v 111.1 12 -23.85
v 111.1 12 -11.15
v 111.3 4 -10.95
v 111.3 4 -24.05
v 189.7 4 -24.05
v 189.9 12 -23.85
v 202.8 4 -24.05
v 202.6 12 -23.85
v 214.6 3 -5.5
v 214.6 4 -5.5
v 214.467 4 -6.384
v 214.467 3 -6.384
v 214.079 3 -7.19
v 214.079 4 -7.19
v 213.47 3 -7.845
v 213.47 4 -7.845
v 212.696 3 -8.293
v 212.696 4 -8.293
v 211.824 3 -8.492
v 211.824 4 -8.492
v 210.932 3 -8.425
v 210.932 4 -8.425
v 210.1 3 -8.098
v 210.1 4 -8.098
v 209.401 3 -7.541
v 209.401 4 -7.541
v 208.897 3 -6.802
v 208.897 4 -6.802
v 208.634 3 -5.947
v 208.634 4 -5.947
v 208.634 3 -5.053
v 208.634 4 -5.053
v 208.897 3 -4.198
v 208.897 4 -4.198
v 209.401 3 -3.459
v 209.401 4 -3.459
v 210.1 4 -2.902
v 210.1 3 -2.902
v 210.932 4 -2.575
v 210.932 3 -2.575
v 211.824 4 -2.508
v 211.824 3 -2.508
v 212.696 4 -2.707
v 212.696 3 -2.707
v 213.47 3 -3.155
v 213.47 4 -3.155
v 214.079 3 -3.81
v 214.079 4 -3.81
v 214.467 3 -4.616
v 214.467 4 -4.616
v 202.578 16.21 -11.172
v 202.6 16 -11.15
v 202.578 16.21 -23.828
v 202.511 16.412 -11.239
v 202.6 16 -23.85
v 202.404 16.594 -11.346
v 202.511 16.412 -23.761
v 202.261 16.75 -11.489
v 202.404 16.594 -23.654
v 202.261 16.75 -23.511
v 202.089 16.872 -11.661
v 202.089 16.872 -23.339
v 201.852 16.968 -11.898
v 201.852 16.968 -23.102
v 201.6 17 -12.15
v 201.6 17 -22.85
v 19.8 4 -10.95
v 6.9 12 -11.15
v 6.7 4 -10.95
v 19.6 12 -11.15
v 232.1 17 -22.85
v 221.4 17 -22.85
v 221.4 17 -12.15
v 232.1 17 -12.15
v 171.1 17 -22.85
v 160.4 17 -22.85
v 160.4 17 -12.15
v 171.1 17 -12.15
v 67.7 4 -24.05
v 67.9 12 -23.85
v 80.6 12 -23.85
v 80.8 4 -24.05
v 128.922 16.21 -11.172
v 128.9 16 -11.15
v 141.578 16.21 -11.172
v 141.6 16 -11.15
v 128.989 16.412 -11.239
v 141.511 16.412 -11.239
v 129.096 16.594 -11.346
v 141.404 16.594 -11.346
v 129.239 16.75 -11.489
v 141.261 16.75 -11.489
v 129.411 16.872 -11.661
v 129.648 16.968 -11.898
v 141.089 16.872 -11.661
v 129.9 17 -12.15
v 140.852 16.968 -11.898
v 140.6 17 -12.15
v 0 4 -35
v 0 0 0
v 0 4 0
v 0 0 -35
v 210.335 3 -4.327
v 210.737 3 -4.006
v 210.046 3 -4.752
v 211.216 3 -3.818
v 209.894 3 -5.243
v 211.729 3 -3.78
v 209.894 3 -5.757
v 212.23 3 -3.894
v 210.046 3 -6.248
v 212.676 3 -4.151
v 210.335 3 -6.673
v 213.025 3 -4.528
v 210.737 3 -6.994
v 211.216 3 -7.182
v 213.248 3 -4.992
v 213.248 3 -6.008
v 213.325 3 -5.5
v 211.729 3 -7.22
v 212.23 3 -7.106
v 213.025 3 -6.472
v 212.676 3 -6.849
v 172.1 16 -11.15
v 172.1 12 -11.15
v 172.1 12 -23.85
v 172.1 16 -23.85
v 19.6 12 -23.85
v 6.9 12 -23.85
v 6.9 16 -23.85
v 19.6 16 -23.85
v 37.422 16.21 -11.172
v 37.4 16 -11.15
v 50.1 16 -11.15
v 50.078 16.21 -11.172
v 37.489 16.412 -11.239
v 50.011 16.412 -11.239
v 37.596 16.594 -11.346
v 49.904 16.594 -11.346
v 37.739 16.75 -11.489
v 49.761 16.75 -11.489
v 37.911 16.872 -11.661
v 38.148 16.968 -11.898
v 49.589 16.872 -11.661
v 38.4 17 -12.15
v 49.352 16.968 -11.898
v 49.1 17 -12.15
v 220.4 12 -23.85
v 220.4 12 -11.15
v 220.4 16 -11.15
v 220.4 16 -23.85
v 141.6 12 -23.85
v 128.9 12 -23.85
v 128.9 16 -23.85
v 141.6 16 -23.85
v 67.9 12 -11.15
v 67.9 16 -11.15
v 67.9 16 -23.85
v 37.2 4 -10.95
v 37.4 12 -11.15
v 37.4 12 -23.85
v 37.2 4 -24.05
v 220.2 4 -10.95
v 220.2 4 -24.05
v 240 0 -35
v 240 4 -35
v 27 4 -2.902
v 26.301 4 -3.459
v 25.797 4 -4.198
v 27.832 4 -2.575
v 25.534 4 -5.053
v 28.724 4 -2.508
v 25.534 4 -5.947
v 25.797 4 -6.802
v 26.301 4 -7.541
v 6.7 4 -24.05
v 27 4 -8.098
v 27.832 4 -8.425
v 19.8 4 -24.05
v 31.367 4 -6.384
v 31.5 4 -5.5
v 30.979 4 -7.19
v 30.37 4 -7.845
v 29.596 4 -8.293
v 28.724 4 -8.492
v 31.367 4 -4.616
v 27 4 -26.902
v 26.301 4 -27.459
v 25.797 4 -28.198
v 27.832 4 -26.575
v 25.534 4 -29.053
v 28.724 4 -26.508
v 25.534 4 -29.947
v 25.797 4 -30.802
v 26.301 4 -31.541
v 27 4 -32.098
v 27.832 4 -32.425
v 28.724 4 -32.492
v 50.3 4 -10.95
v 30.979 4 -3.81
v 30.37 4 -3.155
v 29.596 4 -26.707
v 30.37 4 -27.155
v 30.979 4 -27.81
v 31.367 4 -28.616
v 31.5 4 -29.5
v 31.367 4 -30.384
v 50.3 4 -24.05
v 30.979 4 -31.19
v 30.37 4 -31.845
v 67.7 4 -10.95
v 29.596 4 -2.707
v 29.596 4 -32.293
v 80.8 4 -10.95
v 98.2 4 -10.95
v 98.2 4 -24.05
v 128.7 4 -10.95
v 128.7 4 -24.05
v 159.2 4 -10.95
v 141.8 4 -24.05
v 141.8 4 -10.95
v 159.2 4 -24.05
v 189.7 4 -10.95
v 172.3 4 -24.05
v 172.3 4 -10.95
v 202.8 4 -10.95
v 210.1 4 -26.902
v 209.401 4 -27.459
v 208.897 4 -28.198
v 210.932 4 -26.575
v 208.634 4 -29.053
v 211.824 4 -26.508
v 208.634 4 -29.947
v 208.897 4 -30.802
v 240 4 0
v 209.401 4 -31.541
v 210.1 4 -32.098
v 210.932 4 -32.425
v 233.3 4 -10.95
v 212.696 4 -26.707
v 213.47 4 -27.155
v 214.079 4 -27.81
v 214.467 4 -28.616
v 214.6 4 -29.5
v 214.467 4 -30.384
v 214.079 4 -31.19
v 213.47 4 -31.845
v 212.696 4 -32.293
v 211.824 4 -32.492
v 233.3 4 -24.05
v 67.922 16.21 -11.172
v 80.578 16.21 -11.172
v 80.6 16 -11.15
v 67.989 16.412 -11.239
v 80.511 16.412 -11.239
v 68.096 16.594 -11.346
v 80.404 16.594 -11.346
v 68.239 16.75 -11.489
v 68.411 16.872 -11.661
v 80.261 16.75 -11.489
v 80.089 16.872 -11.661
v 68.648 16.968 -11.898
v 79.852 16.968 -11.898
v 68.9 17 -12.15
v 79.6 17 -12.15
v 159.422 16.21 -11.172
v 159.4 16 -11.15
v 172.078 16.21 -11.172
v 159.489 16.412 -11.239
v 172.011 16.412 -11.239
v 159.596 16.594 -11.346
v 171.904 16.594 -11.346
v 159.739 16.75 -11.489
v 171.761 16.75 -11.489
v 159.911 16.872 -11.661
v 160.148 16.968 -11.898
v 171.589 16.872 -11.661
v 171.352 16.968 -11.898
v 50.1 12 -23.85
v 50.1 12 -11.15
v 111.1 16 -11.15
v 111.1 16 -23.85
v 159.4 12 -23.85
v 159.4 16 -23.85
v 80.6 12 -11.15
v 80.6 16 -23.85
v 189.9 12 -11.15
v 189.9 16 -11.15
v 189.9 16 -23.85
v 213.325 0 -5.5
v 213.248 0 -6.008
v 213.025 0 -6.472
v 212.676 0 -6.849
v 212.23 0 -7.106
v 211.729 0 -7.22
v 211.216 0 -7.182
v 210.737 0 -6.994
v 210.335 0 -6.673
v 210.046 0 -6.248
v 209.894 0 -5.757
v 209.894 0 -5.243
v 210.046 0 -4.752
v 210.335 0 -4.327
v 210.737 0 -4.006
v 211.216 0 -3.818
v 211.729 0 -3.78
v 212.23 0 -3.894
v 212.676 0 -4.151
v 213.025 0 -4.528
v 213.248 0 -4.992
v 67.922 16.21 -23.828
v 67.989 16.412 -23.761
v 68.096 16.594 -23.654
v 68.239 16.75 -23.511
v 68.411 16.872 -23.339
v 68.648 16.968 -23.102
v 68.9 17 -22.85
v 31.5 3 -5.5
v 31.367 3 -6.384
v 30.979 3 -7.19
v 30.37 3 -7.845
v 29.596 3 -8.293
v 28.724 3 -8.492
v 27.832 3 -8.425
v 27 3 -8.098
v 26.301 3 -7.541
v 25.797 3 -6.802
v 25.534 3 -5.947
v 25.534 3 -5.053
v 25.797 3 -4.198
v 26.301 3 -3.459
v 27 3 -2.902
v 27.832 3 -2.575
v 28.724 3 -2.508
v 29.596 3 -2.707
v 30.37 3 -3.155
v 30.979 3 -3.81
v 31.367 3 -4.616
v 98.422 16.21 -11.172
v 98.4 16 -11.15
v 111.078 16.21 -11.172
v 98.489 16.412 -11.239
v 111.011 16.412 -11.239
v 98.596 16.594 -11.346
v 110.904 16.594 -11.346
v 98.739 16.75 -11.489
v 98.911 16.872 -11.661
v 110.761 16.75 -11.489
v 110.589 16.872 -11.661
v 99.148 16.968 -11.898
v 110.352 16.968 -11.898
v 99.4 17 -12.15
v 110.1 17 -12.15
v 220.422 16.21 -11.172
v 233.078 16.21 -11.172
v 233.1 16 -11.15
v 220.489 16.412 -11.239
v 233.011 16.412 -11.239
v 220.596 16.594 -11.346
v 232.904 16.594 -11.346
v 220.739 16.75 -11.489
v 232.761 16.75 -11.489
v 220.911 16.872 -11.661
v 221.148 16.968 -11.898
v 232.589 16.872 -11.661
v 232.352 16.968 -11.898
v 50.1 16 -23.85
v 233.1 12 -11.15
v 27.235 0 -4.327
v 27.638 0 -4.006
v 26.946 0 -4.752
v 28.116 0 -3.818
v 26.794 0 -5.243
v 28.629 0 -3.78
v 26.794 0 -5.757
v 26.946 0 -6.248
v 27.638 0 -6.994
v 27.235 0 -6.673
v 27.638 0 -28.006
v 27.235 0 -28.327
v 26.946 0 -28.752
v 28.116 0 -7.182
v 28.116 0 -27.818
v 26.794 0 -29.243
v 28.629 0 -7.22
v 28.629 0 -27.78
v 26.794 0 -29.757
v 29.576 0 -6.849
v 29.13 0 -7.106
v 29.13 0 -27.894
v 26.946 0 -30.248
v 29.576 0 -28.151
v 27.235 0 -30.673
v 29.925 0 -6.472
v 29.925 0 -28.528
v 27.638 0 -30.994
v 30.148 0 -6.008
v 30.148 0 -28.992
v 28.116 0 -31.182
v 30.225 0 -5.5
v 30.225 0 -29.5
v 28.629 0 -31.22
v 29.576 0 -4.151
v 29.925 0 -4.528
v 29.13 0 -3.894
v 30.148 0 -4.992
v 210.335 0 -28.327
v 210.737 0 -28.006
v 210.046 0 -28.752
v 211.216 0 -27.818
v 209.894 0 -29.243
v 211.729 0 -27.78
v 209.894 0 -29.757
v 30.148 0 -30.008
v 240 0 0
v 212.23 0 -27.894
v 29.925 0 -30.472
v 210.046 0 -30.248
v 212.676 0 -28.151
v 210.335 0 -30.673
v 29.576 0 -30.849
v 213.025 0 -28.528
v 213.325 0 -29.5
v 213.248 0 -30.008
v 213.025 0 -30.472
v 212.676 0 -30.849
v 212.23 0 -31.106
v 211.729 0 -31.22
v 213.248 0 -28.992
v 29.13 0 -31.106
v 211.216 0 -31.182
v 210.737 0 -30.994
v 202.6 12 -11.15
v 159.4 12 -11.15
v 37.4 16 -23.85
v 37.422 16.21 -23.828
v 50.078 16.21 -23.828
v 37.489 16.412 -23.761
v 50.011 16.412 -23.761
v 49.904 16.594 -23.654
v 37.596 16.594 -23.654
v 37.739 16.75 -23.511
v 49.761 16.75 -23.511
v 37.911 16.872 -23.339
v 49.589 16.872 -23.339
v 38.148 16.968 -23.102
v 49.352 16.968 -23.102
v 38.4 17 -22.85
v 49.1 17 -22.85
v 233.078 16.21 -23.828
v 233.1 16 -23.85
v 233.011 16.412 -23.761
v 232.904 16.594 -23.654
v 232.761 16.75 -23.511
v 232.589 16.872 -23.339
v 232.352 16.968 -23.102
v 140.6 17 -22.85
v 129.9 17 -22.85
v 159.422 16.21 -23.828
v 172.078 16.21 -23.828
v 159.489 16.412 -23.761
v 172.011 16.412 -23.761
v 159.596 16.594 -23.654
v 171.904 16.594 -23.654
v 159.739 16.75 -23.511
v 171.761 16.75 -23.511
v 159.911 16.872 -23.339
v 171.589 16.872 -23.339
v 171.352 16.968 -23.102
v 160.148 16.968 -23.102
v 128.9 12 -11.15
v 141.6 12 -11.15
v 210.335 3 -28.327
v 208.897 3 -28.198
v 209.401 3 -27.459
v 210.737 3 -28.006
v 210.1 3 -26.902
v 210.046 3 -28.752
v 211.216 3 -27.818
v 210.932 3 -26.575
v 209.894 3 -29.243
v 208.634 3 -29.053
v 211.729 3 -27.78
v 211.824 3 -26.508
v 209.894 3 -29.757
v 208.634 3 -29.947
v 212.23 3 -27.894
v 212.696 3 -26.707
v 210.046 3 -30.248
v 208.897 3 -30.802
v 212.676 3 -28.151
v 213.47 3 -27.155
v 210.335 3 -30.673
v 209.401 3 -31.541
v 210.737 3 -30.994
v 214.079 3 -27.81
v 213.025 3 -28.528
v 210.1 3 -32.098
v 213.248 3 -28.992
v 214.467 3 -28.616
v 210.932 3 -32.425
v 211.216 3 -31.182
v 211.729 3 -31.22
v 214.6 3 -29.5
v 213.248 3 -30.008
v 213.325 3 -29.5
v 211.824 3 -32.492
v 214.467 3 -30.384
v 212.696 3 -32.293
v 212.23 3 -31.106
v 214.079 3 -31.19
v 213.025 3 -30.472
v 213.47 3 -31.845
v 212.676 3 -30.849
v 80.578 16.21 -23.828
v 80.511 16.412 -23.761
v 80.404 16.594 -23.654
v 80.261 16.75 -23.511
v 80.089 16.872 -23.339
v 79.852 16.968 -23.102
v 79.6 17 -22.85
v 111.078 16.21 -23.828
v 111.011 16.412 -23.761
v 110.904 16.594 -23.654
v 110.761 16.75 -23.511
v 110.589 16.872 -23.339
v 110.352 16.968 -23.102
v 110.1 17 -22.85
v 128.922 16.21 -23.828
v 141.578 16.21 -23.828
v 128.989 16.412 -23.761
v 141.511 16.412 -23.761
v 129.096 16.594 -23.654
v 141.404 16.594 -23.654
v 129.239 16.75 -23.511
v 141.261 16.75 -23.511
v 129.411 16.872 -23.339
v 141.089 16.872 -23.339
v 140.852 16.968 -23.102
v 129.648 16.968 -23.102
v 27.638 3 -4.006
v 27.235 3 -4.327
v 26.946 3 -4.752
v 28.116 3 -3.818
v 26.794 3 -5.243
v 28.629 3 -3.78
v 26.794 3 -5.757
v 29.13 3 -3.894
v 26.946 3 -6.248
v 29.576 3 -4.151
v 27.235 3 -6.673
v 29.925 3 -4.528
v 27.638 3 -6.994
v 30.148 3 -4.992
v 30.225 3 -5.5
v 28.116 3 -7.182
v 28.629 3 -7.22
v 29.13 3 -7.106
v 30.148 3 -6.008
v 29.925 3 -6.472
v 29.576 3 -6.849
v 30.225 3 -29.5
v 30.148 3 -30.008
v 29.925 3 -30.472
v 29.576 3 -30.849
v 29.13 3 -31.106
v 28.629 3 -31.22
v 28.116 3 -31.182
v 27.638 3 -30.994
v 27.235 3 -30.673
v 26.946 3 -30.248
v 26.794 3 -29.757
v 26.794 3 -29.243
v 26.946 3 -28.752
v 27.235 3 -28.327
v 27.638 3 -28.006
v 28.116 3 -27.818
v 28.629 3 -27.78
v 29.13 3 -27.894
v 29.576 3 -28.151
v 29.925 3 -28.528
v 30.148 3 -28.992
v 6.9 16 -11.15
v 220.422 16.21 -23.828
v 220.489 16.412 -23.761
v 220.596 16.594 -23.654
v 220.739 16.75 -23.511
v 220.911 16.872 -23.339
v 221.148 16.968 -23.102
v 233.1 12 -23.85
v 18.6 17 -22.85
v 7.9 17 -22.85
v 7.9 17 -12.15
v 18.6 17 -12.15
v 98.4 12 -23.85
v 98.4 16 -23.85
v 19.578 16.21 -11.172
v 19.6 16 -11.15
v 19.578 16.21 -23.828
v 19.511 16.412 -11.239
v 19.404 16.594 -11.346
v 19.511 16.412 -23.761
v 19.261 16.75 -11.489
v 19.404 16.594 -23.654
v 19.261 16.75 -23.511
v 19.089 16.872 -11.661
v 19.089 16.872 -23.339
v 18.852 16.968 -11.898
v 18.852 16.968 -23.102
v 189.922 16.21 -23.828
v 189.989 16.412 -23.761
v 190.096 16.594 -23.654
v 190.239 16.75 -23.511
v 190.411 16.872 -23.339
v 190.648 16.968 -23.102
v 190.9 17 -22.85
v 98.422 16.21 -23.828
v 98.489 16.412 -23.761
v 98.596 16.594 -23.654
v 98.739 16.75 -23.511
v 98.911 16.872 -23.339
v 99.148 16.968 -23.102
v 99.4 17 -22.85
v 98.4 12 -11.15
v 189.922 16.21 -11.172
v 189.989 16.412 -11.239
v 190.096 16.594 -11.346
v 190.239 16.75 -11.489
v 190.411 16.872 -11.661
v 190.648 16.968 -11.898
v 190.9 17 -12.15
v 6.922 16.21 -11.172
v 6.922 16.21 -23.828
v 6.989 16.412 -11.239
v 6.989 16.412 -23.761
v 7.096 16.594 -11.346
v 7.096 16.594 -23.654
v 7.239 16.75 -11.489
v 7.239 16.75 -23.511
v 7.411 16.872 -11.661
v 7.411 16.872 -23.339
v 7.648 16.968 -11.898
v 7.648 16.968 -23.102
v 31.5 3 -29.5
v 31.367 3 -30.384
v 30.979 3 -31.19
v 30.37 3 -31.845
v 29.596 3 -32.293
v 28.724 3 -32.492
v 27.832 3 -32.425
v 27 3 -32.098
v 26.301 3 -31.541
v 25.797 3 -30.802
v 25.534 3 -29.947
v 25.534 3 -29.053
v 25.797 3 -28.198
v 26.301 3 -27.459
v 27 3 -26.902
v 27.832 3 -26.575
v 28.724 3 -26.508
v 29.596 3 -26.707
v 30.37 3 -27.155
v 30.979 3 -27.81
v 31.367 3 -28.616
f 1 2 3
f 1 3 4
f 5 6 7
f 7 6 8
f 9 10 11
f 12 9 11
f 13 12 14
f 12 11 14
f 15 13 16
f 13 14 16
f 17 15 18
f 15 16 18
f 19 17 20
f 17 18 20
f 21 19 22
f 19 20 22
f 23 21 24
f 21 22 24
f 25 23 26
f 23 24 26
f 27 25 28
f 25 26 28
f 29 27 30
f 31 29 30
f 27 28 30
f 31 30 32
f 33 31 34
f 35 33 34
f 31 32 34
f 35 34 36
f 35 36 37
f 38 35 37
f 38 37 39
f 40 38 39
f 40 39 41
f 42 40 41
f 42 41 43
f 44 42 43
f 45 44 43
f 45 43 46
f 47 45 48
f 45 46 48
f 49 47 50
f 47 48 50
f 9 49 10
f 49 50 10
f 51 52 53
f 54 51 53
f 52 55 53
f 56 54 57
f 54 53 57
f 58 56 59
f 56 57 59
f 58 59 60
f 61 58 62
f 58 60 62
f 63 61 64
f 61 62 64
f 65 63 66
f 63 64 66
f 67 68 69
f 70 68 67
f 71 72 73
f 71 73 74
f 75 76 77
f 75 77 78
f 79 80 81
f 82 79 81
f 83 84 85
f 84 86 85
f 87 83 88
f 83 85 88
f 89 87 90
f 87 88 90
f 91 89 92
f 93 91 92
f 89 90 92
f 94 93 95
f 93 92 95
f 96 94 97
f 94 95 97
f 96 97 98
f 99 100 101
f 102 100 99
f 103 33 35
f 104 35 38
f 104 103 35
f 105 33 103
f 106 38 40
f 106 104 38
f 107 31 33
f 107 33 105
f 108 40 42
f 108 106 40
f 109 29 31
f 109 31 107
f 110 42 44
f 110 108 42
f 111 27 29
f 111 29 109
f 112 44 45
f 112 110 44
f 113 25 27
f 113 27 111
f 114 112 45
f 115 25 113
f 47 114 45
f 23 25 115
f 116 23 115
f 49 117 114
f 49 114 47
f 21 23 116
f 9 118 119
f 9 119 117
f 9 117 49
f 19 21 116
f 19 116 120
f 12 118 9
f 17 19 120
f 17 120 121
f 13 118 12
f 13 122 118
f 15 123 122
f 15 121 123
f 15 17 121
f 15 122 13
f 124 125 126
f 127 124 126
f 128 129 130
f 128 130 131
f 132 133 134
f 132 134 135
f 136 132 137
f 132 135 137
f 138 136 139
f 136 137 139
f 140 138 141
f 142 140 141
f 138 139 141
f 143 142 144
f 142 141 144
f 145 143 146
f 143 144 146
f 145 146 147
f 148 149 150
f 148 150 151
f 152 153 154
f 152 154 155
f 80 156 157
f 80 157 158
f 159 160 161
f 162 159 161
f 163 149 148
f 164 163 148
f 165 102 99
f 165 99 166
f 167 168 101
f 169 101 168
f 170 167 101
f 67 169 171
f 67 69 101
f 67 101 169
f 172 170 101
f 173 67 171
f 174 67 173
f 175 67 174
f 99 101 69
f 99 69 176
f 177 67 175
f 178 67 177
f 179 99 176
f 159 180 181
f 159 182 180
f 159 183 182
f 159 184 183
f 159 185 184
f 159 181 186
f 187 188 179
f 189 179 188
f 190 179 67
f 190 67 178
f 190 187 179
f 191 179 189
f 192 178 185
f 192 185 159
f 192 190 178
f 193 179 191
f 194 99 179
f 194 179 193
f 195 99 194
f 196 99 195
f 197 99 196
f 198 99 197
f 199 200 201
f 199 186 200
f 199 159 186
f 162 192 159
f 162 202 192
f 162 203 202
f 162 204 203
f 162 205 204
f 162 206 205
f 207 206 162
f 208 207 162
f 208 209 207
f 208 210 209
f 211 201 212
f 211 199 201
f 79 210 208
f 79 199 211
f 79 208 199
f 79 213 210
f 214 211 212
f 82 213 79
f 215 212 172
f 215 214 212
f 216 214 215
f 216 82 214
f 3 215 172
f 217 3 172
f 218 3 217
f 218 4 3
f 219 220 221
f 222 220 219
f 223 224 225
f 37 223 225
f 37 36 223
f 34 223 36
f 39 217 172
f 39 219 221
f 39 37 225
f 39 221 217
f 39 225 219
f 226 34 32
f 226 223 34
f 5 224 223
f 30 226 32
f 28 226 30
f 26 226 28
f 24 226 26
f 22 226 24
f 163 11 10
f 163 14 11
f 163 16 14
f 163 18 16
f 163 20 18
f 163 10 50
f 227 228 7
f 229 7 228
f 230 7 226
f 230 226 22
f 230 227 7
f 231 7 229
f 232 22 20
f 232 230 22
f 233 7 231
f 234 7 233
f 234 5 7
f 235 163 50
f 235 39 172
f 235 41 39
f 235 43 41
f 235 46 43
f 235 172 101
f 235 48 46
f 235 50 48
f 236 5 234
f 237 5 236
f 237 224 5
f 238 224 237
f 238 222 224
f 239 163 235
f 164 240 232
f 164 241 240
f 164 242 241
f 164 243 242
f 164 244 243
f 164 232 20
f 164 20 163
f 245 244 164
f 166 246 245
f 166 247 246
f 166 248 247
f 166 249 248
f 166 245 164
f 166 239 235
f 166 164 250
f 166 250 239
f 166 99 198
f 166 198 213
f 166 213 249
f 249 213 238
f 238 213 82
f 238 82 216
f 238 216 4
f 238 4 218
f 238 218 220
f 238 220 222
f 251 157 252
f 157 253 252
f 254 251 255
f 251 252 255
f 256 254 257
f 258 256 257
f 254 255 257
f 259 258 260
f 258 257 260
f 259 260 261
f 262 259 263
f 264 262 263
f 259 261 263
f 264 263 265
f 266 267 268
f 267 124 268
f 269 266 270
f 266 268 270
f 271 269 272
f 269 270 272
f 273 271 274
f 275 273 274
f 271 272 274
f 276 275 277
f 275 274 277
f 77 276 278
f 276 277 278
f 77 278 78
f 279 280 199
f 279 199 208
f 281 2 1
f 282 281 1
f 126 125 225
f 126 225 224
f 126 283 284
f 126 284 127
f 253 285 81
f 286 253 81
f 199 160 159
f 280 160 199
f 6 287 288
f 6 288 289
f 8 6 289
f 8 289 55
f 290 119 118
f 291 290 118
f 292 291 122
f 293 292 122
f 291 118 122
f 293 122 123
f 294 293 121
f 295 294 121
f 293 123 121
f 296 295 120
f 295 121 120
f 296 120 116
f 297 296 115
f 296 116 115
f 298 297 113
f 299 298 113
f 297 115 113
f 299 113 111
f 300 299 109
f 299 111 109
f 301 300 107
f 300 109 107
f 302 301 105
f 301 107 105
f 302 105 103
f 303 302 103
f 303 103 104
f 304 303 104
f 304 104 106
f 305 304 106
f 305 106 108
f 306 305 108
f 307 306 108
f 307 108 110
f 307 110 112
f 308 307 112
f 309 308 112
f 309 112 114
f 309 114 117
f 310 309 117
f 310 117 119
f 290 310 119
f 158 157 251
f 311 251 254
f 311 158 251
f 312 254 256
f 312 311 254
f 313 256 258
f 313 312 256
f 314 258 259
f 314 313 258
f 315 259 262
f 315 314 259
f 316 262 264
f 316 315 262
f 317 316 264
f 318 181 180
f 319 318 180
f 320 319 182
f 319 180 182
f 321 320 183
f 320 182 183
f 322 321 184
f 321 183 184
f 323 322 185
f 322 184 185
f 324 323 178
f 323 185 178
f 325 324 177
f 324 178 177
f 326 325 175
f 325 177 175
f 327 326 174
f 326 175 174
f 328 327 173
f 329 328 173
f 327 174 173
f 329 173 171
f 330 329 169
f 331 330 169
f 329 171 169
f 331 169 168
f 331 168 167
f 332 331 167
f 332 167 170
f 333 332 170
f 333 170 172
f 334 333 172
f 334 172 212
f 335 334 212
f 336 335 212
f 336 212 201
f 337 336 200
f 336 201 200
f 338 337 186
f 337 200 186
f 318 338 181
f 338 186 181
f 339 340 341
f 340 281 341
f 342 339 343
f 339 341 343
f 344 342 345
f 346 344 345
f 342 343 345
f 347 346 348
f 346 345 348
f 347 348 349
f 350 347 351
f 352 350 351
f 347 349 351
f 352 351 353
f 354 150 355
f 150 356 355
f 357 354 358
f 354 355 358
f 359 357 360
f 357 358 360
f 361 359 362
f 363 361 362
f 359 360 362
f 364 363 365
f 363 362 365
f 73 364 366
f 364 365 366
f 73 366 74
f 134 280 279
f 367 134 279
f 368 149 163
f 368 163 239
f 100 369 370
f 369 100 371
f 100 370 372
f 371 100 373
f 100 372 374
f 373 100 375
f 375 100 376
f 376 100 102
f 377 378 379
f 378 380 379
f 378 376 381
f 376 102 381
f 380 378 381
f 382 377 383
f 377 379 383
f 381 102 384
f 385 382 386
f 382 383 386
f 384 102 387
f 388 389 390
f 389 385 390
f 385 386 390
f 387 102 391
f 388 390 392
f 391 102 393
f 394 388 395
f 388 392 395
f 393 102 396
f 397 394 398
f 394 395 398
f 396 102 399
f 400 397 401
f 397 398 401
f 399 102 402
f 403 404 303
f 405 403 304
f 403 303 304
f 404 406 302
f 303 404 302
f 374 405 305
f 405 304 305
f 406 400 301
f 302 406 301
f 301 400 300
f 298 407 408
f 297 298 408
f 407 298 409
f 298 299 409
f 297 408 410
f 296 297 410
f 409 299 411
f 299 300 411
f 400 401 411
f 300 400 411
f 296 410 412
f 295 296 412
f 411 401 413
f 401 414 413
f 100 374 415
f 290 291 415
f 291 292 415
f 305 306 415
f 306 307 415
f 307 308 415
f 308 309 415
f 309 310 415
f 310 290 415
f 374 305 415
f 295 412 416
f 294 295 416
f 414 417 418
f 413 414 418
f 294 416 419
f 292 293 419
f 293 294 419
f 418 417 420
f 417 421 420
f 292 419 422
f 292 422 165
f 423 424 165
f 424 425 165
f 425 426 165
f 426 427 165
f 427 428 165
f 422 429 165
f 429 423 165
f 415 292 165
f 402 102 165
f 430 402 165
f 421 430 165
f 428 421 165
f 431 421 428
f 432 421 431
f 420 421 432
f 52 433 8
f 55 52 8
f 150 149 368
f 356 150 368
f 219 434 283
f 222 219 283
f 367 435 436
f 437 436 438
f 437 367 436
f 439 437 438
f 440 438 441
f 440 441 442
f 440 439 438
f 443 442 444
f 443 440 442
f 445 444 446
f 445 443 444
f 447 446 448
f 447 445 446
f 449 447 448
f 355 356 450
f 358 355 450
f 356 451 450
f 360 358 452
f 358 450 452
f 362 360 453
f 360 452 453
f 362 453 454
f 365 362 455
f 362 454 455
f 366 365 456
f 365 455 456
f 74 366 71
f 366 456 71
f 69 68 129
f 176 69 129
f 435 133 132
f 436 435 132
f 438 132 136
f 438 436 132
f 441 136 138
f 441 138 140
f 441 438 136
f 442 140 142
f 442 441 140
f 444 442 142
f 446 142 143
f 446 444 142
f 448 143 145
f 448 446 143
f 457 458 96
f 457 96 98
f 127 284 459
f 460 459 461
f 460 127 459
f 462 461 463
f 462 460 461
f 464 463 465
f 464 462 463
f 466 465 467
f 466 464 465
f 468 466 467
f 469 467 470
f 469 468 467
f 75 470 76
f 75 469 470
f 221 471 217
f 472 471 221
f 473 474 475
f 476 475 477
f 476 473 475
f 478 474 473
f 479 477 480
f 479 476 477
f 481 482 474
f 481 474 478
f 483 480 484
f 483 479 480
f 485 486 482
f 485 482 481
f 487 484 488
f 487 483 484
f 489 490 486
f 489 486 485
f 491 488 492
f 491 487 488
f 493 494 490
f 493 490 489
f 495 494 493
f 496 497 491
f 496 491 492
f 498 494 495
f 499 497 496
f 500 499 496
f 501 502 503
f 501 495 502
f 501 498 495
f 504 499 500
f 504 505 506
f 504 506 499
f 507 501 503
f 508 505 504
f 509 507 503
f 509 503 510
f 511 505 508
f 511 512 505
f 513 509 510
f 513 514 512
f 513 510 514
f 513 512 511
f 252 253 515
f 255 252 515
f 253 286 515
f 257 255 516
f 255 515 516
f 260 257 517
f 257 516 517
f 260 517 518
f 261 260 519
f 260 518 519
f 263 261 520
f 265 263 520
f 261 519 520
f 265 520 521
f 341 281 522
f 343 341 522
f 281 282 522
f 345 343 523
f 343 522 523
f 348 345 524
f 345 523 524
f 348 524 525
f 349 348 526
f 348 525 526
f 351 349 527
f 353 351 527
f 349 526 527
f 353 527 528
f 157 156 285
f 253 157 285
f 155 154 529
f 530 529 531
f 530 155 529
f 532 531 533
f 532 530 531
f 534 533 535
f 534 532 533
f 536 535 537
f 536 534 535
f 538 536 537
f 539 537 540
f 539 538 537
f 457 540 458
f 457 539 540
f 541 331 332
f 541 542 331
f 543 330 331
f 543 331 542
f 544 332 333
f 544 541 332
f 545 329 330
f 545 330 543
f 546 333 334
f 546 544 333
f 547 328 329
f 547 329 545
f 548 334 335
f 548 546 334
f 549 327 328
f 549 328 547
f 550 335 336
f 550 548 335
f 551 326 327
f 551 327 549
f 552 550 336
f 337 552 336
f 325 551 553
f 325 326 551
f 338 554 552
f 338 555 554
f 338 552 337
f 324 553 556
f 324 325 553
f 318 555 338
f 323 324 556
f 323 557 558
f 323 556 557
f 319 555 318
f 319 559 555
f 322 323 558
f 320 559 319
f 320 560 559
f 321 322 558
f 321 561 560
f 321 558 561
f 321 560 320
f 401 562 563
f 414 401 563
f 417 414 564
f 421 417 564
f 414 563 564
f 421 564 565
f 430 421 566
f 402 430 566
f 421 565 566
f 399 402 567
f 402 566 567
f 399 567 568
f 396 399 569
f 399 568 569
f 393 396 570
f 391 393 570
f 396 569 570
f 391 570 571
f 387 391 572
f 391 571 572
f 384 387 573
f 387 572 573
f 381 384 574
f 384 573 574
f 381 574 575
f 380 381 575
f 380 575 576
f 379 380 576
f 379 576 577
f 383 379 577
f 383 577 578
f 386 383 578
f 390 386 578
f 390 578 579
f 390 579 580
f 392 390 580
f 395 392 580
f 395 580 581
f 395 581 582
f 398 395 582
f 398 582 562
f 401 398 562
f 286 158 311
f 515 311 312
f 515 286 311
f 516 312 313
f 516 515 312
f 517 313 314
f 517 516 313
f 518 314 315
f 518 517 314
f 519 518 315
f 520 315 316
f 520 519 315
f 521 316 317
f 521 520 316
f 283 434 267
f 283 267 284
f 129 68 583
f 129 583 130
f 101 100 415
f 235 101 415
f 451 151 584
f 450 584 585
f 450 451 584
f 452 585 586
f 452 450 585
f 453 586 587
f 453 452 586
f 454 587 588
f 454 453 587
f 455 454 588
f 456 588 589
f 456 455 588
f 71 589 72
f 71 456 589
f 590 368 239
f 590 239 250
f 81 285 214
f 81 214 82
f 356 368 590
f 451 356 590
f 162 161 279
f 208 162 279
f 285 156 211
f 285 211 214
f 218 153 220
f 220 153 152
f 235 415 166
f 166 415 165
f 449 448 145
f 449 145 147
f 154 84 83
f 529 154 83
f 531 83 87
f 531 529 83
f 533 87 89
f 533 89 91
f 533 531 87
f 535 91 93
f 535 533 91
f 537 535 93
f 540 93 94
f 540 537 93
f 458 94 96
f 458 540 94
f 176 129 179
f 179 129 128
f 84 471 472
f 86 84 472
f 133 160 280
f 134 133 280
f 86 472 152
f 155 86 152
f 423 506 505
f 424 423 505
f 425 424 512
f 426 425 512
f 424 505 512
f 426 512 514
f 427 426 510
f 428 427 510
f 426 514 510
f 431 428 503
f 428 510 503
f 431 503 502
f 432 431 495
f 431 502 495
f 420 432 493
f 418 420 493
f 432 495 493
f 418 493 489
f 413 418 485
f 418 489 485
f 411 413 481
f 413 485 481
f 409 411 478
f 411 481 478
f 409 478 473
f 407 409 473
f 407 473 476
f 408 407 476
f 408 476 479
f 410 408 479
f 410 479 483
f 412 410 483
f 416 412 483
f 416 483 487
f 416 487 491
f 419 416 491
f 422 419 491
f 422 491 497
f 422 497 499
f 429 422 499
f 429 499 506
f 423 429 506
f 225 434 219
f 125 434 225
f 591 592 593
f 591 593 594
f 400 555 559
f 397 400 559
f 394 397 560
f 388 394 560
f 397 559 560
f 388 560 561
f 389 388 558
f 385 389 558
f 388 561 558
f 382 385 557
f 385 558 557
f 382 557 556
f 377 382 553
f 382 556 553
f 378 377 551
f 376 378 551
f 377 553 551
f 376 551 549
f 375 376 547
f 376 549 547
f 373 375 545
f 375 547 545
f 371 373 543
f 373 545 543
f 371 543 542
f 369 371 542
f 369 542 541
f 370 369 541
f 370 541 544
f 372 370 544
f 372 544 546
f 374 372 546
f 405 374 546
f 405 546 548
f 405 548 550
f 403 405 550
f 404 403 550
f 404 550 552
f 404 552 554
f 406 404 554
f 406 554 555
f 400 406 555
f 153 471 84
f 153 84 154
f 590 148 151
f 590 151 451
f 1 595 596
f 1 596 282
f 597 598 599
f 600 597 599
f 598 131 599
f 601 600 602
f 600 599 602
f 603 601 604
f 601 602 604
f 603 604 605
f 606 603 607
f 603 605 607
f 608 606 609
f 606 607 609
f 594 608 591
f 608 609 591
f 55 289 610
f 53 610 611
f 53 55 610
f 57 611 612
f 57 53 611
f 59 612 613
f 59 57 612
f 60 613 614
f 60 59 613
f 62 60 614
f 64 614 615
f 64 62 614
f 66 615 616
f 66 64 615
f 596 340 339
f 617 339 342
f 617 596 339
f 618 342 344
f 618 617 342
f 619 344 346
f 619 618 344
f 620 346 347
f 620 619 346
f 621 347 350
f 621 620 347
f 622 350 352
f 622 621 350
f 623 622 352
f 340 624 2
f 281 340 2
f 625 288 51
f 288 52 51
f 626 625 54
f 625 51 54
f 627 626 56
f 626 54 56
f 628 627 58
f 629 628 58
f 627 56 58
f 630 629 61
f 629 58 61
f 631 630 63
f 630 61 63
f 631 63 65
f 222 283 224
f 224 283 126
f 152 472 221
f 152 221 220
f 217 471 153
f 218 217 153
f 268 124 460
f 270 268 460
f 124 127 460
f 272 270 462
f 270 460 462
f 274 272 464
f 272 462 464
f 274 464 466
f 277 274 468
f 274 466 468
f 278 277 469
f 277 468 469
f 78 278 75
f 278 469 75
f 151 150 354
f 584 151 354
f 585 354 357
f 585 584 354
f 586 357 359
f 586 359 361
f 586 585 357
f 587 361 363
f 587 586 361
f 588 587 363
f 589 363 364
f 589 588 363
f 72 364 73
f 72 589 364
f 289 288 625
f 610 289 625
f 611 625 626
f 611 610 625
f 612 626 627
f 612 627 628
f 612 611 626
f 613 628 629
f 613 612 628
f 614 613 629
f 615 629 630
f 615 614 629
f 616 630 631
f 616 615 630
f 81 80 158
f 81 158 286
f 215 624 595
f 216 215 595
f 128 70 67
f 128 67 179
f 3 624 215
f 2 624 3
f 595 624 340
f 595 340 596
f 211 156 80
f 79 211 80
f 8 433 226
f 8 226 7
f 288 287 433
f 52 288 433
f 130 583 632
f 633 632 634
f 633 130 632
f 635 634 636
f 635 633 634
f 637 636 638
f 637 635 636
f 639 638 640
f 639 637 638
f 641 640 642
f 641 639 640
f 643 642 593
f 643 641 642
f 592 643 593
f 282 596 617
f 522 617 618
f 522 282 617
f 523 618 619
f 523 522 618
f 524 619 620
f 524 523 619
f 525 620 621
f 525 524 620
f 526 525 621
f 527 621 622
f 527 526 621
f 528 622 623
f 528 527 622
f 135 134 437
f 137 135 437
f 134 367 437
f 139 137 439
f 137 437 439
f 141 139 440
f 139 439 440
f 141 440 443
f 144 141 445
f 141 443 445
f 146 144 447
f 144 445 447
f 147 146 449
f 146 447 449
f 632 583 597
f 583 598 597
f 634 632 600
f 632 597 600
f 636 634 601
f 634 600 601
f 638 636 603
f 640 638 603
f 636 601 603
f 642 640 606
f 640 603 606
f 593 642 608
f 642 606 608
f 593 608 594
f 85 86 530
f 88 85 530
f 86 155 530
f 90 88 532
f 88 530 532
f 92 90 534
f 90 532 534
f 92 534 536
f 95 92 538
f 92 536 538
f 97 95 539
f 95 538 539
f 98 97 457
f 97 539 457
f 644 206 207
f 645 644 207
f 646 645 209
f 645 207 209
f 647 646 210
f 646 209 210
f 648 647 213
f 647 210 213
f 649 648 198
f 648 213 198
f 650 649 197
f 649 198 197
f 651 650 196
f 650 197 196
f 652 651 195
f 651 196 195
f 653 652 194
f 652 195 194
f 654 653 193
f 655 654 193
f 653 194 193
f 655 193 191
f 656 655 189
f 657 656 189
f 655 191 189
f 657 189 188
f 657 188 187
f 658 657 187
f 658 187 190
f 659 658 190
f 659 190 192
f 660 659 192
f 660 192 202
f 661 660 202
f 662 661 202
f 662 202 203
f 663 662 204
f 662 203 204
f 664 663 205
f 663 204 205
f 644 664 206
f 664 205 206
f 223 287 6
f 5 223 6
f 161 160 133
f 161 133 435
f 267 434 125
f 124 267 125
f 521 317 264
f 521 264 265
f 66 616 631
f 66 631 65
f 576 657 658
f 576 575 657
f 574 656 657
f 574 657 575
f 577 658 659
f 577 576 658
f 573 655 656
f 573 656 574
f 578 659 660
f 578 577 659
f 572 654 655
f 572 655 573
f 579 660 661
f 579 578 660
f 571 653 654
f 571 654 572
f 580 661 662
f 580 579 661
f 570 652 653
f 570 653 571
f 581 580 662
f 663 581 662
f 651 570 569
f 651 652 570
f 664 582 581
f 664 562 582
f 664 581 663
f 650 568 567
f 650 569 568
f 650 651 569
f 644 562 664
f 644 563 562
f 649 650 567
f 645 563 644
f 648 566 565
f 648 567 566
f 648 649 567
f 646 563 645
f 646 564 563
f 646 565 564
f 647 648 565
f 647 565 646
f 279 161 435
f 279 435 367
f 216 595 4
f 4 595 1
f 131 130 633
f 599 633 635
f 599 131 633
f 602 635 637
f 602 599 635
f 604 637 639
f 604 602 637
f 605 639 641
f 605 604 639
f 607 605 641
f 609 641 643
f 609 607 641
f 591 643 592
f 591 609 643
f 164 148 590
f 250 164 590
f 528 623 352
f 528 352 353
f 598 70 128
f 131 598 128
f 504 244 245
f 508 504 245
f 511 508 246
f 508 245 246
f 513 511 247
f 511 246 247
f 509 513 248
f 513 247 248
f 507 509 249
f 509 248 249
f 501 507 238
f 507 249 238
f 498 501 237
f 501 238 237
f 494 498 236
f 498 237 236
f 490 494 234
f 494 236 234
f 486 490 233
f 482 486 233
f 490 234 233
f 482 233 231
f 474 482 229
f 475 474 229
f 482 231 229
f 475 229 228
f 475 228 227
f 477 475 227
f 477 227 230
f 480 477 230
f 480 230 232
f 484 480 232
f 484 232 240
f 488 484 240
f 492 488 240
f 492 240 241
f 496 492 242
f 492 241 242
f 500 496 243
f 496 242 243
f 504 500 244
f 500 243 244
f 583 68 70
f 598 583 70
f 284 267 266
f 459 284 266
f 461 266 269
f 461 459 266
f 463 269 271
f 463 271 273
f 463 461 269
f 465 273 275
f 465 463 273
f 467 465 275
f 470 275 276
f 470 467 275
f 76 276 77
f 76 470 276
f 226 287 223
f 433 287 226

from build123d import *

# Parameters (mm, degrees)
SKETCH1_W                = 240
SKETCH1_H                = 35
SKETCH1_W_2              = 12.7
SKETCH1_H_2              = 12.7
BOSS_EXTRUDE1_DEPTH      = 4
SKETCH2_W                = 12.7
SKETCH2_H                = 12.7
BOSS_EXTRUDE2_DEPTH      = 13
BOSS_EXTRUDE2_DEPTH_BACK = 4
CHAMFER1_SIZE            = 0.2
CHAMFER1_SIZE2           = 8
SKETCH3_R                = 1.725
CUT_EXTRUDE1_DEPTH       = 5
SKETCH4_R                = 3
CUT_EXTRUDE2_DEPTH       = 1
FILLET1_R                = 1


with BuildPart() as part:
    # Sketch1 → Boss-Extrude1 (new body)
    with BuildSketch(Plane(origin=(0, 0, 0), x_dir=(1, 0, 0), z_dir=(0, 1, 0))):
        with Locations((120, 17.5)):
            Rectangle(SKETCH1_W, SKETCH1_H)
        with Locations((13.25, 17.5)):
            Rectangle(SKETCH1_W_2, SKETCH1_H_2, mode=Mode.SUBTRACT)
        with Locations((43.75, 17.5)):
            Rectangle(SKETCH1_W_2, SKETCH1_H_2, mode=Mode.SUBTRACT)
        with Locations((74.25, 17.5)):
            Rectangle(SKETCH1_W_2, SKETCH1_H_2, mode=Mode.SUBTRACT)
        with Locations((104.75, 17.5)):
            Rectangle(SKETCH1_W_2, SKETCH1_H_2, mode=Mode.SUBTRACT)
        with Locations((135.25, 17.5)):
            Rectangle(SKETCH1_W_2, SKETCH1_H_2, mode=Mode.SUBTRACT)
        with Locations((165.75, 17.5)):
            Rectangle(SKETCH1_W_2, SKETCH1_H_2, mode=Mode.SUBTRACT)
        with Locations((196.25, 17.5)):
            Rectangle(SKETCH1_W_2, SKETCH1_H_2, mode=Mode.SUBTRACT)
        with Locations((226.75, 17.5)):
            Rectangle(SKETCH1_W_2, SKETCH1_H_2, mode=Mode.SUBTRACT)
    extrude(amount=BOSS_EXTRUDE1_DEPTH)

    # Sketch2 → Boss-Extrude2 (add, two sides)
    with BuildSketch(Plane(origin=(0, 4, 0), x_dir=(1, 0, 0), z_dir=(0, 1, 0))) as boss_extrude2_sk:
        with Locations((13.25, 17.5)):
            Rectangle(SKETCH2_W, SKETCH2_H)
        with Locations((43.75, 17.5)):
            Rectangle(SKETCH2_W, SKETCH2_H)
        with Locations((74.25, 17.5)):
            Rectangle(SKETCH2_W, SKETCH2_H)
        with Locations((104.75, 17.5)):
            Rectangle(SKETCH2_W, SKETCH2_H)
        with Locations((135.25, 17.5)):
            Rectangle(SKETCH2_W, SKETCH2_H)
        with Locations((165.75, 17.5)):
            Rectangle(SKETCH2_W, SKETCH2_H)
        with Locations((196.25, 17.5)):
            Rectangle(SKETCH2_W, SKETCH2_H)
        with Locations((226.75, 17.5)):
            Rectangle(SKETCH2_W, SKETCH2_H)
    extrude(amount=BOSS_EXTRUDE2_DEPTH)
    extrude(boss_extrude2_sk.sketch, amount=-BOSS_EXTRUDE2_DEPTH_BACK)

    # Chamfer1
    chamfer1_edges = [part.edges().sort_by_distance(p)[0] for p in [
        (189.9, 4, -17.5),
        (196.25, 4, -11.15),
        (202.6, 4, -17.5),
        (196.25, 4, -23.85),
        (6.9, 4, -17.5),
        (13.25, 4, -11.15),
        (19.6, 4, -17.5),
        (13.25, 4, -23.85),
        (67.9, 4, -17.5),
        (74.25, 4, -11.15),
        (80.6, 4, -17.5),
        (74.25, 4, -23.85),
        (37.4, 4, -17.5),
        (43.75, 4, -11.15),
        (50.1, 4, -17.5),
        (43.75, 4, -23.85),
        (98.4, 4, -17.5),
        (104.75, 4, -11.15),
        (111.1, 4, -17.5),
        (104.75, 4, -23.85),
        (128.9, 4, -17.5),
        (135.25, 4, -11.15),
        (141.6, 4, -17.5),
        (135.25, 4, -23.85),
        (159.4, 4, -17.5),
        (165.75, 4, -11.15),
        (172.1, 4, -17.5),
        (165.75, 4, -23.85),
        (220.4, 4, -17.5),
        (226.75, 4, -11.15),
        (233.1, 4, -17.5),
        (226.75, 4, -23.85),
    ]]
    chamfer1_side = [part.faces().sort_by_distance(p)[0] for p in [
        (120, 4, -17.5),
    ]]
    chamfer(chamfer1_edges, length=CHAMFER1_SIZE, length2=CHAMFER1_SIZE2, reference=chamfer1_side[0])

    # Sketch3 → Cut-Extrude1 (cut, through all)
    with BuildSketch(Plane(origin=(0, 4, 0), x_dir=(1, 0, 0), z_dir=(0, 1, 0))):
        with Locations((28.5, 5.5)):
            Circle(SKETCH3_R)
        with Locations((28.5, 29.5)):
            Circle(SKETCH3_R)
        with Locations((211.6, 29.5)):
            Circle(SKETCH3_R)
        with Locations((211.6, 5.5)):
            Circle(SKETCH3_R)
    extrude(amount=-CUT_EXTRUDE1_DEPTH, mode=Mode.SUBTRACT)

    # Sketch4 → Cut-Extrude2 (cut)
    with BuildSketch(Plane(origin=(0, 4, 0), x_dir=(1, 0, 0), z_dir=(0, 1, 0))):
        with Locations((28.5, 29.5)):
            Circle(SKETCH4_R)
        with Locations((28.5, 5.5)):
            Circle(SKETCH4_R)
        with Locations((211.6, 5.5)):
            Circle(SKETCH4_R)
        with Locations((211.6, 29.5)):
            Circle(SKETCH4_R)
    extrude(amount=-CUT_EXTRUDE2_DEPTH, mode=Mode.SUBTRACT)

    # Fillet1
    fillet1_edges = [part.edges().sort_by_distance(p)[0] for p in [
        (6.9, 17, -17.5),
        (13.25, 17, -11.15),
        (19.6, 17, -17.5),
        (13.25, 17, -23.85),
        (37.4, 17, -17.5),
        (43.75, 17, -11.15),
        (50.1, 17, -17.5),
        (43.75, 17, -23.85),
        (67.9, 17, -17.5),
        (74.25, 17, -11.15),
        (80.6, 17, -17.5),
        (74.25, 17, -23.85),
        (98.4, 17, -17.5),
        (104.75, 17, -11.15),
        (111.1, 17, -17.5),
        (104.75, 17, -23.85),
        (128.9, 17, -17.5),
        (135.25, 17, -11.15),
        (141.6, 17, -17.5),
        (135.25, 17, -23.85),
        (159.4, 17, -17.5),
        (165.75, 17, -11.15),
        (172.1, 17, -17.5),
        (165.75, 17, -23.85),
        (189.9, 17, -17.5),
        (196.25, 17, -11.15),
        (202.6, 17, -17.5),
        (196.25, 17, -23.85),
        (220.4, 17, -17.5),
        (226.75, 17, -11.15),
        (233.1, 17, -17.5),
        (226.75, 17, -23.85),
    ]]
    fillet(fillet1_edges, radius=FILLET1_R)


solid = part.part
